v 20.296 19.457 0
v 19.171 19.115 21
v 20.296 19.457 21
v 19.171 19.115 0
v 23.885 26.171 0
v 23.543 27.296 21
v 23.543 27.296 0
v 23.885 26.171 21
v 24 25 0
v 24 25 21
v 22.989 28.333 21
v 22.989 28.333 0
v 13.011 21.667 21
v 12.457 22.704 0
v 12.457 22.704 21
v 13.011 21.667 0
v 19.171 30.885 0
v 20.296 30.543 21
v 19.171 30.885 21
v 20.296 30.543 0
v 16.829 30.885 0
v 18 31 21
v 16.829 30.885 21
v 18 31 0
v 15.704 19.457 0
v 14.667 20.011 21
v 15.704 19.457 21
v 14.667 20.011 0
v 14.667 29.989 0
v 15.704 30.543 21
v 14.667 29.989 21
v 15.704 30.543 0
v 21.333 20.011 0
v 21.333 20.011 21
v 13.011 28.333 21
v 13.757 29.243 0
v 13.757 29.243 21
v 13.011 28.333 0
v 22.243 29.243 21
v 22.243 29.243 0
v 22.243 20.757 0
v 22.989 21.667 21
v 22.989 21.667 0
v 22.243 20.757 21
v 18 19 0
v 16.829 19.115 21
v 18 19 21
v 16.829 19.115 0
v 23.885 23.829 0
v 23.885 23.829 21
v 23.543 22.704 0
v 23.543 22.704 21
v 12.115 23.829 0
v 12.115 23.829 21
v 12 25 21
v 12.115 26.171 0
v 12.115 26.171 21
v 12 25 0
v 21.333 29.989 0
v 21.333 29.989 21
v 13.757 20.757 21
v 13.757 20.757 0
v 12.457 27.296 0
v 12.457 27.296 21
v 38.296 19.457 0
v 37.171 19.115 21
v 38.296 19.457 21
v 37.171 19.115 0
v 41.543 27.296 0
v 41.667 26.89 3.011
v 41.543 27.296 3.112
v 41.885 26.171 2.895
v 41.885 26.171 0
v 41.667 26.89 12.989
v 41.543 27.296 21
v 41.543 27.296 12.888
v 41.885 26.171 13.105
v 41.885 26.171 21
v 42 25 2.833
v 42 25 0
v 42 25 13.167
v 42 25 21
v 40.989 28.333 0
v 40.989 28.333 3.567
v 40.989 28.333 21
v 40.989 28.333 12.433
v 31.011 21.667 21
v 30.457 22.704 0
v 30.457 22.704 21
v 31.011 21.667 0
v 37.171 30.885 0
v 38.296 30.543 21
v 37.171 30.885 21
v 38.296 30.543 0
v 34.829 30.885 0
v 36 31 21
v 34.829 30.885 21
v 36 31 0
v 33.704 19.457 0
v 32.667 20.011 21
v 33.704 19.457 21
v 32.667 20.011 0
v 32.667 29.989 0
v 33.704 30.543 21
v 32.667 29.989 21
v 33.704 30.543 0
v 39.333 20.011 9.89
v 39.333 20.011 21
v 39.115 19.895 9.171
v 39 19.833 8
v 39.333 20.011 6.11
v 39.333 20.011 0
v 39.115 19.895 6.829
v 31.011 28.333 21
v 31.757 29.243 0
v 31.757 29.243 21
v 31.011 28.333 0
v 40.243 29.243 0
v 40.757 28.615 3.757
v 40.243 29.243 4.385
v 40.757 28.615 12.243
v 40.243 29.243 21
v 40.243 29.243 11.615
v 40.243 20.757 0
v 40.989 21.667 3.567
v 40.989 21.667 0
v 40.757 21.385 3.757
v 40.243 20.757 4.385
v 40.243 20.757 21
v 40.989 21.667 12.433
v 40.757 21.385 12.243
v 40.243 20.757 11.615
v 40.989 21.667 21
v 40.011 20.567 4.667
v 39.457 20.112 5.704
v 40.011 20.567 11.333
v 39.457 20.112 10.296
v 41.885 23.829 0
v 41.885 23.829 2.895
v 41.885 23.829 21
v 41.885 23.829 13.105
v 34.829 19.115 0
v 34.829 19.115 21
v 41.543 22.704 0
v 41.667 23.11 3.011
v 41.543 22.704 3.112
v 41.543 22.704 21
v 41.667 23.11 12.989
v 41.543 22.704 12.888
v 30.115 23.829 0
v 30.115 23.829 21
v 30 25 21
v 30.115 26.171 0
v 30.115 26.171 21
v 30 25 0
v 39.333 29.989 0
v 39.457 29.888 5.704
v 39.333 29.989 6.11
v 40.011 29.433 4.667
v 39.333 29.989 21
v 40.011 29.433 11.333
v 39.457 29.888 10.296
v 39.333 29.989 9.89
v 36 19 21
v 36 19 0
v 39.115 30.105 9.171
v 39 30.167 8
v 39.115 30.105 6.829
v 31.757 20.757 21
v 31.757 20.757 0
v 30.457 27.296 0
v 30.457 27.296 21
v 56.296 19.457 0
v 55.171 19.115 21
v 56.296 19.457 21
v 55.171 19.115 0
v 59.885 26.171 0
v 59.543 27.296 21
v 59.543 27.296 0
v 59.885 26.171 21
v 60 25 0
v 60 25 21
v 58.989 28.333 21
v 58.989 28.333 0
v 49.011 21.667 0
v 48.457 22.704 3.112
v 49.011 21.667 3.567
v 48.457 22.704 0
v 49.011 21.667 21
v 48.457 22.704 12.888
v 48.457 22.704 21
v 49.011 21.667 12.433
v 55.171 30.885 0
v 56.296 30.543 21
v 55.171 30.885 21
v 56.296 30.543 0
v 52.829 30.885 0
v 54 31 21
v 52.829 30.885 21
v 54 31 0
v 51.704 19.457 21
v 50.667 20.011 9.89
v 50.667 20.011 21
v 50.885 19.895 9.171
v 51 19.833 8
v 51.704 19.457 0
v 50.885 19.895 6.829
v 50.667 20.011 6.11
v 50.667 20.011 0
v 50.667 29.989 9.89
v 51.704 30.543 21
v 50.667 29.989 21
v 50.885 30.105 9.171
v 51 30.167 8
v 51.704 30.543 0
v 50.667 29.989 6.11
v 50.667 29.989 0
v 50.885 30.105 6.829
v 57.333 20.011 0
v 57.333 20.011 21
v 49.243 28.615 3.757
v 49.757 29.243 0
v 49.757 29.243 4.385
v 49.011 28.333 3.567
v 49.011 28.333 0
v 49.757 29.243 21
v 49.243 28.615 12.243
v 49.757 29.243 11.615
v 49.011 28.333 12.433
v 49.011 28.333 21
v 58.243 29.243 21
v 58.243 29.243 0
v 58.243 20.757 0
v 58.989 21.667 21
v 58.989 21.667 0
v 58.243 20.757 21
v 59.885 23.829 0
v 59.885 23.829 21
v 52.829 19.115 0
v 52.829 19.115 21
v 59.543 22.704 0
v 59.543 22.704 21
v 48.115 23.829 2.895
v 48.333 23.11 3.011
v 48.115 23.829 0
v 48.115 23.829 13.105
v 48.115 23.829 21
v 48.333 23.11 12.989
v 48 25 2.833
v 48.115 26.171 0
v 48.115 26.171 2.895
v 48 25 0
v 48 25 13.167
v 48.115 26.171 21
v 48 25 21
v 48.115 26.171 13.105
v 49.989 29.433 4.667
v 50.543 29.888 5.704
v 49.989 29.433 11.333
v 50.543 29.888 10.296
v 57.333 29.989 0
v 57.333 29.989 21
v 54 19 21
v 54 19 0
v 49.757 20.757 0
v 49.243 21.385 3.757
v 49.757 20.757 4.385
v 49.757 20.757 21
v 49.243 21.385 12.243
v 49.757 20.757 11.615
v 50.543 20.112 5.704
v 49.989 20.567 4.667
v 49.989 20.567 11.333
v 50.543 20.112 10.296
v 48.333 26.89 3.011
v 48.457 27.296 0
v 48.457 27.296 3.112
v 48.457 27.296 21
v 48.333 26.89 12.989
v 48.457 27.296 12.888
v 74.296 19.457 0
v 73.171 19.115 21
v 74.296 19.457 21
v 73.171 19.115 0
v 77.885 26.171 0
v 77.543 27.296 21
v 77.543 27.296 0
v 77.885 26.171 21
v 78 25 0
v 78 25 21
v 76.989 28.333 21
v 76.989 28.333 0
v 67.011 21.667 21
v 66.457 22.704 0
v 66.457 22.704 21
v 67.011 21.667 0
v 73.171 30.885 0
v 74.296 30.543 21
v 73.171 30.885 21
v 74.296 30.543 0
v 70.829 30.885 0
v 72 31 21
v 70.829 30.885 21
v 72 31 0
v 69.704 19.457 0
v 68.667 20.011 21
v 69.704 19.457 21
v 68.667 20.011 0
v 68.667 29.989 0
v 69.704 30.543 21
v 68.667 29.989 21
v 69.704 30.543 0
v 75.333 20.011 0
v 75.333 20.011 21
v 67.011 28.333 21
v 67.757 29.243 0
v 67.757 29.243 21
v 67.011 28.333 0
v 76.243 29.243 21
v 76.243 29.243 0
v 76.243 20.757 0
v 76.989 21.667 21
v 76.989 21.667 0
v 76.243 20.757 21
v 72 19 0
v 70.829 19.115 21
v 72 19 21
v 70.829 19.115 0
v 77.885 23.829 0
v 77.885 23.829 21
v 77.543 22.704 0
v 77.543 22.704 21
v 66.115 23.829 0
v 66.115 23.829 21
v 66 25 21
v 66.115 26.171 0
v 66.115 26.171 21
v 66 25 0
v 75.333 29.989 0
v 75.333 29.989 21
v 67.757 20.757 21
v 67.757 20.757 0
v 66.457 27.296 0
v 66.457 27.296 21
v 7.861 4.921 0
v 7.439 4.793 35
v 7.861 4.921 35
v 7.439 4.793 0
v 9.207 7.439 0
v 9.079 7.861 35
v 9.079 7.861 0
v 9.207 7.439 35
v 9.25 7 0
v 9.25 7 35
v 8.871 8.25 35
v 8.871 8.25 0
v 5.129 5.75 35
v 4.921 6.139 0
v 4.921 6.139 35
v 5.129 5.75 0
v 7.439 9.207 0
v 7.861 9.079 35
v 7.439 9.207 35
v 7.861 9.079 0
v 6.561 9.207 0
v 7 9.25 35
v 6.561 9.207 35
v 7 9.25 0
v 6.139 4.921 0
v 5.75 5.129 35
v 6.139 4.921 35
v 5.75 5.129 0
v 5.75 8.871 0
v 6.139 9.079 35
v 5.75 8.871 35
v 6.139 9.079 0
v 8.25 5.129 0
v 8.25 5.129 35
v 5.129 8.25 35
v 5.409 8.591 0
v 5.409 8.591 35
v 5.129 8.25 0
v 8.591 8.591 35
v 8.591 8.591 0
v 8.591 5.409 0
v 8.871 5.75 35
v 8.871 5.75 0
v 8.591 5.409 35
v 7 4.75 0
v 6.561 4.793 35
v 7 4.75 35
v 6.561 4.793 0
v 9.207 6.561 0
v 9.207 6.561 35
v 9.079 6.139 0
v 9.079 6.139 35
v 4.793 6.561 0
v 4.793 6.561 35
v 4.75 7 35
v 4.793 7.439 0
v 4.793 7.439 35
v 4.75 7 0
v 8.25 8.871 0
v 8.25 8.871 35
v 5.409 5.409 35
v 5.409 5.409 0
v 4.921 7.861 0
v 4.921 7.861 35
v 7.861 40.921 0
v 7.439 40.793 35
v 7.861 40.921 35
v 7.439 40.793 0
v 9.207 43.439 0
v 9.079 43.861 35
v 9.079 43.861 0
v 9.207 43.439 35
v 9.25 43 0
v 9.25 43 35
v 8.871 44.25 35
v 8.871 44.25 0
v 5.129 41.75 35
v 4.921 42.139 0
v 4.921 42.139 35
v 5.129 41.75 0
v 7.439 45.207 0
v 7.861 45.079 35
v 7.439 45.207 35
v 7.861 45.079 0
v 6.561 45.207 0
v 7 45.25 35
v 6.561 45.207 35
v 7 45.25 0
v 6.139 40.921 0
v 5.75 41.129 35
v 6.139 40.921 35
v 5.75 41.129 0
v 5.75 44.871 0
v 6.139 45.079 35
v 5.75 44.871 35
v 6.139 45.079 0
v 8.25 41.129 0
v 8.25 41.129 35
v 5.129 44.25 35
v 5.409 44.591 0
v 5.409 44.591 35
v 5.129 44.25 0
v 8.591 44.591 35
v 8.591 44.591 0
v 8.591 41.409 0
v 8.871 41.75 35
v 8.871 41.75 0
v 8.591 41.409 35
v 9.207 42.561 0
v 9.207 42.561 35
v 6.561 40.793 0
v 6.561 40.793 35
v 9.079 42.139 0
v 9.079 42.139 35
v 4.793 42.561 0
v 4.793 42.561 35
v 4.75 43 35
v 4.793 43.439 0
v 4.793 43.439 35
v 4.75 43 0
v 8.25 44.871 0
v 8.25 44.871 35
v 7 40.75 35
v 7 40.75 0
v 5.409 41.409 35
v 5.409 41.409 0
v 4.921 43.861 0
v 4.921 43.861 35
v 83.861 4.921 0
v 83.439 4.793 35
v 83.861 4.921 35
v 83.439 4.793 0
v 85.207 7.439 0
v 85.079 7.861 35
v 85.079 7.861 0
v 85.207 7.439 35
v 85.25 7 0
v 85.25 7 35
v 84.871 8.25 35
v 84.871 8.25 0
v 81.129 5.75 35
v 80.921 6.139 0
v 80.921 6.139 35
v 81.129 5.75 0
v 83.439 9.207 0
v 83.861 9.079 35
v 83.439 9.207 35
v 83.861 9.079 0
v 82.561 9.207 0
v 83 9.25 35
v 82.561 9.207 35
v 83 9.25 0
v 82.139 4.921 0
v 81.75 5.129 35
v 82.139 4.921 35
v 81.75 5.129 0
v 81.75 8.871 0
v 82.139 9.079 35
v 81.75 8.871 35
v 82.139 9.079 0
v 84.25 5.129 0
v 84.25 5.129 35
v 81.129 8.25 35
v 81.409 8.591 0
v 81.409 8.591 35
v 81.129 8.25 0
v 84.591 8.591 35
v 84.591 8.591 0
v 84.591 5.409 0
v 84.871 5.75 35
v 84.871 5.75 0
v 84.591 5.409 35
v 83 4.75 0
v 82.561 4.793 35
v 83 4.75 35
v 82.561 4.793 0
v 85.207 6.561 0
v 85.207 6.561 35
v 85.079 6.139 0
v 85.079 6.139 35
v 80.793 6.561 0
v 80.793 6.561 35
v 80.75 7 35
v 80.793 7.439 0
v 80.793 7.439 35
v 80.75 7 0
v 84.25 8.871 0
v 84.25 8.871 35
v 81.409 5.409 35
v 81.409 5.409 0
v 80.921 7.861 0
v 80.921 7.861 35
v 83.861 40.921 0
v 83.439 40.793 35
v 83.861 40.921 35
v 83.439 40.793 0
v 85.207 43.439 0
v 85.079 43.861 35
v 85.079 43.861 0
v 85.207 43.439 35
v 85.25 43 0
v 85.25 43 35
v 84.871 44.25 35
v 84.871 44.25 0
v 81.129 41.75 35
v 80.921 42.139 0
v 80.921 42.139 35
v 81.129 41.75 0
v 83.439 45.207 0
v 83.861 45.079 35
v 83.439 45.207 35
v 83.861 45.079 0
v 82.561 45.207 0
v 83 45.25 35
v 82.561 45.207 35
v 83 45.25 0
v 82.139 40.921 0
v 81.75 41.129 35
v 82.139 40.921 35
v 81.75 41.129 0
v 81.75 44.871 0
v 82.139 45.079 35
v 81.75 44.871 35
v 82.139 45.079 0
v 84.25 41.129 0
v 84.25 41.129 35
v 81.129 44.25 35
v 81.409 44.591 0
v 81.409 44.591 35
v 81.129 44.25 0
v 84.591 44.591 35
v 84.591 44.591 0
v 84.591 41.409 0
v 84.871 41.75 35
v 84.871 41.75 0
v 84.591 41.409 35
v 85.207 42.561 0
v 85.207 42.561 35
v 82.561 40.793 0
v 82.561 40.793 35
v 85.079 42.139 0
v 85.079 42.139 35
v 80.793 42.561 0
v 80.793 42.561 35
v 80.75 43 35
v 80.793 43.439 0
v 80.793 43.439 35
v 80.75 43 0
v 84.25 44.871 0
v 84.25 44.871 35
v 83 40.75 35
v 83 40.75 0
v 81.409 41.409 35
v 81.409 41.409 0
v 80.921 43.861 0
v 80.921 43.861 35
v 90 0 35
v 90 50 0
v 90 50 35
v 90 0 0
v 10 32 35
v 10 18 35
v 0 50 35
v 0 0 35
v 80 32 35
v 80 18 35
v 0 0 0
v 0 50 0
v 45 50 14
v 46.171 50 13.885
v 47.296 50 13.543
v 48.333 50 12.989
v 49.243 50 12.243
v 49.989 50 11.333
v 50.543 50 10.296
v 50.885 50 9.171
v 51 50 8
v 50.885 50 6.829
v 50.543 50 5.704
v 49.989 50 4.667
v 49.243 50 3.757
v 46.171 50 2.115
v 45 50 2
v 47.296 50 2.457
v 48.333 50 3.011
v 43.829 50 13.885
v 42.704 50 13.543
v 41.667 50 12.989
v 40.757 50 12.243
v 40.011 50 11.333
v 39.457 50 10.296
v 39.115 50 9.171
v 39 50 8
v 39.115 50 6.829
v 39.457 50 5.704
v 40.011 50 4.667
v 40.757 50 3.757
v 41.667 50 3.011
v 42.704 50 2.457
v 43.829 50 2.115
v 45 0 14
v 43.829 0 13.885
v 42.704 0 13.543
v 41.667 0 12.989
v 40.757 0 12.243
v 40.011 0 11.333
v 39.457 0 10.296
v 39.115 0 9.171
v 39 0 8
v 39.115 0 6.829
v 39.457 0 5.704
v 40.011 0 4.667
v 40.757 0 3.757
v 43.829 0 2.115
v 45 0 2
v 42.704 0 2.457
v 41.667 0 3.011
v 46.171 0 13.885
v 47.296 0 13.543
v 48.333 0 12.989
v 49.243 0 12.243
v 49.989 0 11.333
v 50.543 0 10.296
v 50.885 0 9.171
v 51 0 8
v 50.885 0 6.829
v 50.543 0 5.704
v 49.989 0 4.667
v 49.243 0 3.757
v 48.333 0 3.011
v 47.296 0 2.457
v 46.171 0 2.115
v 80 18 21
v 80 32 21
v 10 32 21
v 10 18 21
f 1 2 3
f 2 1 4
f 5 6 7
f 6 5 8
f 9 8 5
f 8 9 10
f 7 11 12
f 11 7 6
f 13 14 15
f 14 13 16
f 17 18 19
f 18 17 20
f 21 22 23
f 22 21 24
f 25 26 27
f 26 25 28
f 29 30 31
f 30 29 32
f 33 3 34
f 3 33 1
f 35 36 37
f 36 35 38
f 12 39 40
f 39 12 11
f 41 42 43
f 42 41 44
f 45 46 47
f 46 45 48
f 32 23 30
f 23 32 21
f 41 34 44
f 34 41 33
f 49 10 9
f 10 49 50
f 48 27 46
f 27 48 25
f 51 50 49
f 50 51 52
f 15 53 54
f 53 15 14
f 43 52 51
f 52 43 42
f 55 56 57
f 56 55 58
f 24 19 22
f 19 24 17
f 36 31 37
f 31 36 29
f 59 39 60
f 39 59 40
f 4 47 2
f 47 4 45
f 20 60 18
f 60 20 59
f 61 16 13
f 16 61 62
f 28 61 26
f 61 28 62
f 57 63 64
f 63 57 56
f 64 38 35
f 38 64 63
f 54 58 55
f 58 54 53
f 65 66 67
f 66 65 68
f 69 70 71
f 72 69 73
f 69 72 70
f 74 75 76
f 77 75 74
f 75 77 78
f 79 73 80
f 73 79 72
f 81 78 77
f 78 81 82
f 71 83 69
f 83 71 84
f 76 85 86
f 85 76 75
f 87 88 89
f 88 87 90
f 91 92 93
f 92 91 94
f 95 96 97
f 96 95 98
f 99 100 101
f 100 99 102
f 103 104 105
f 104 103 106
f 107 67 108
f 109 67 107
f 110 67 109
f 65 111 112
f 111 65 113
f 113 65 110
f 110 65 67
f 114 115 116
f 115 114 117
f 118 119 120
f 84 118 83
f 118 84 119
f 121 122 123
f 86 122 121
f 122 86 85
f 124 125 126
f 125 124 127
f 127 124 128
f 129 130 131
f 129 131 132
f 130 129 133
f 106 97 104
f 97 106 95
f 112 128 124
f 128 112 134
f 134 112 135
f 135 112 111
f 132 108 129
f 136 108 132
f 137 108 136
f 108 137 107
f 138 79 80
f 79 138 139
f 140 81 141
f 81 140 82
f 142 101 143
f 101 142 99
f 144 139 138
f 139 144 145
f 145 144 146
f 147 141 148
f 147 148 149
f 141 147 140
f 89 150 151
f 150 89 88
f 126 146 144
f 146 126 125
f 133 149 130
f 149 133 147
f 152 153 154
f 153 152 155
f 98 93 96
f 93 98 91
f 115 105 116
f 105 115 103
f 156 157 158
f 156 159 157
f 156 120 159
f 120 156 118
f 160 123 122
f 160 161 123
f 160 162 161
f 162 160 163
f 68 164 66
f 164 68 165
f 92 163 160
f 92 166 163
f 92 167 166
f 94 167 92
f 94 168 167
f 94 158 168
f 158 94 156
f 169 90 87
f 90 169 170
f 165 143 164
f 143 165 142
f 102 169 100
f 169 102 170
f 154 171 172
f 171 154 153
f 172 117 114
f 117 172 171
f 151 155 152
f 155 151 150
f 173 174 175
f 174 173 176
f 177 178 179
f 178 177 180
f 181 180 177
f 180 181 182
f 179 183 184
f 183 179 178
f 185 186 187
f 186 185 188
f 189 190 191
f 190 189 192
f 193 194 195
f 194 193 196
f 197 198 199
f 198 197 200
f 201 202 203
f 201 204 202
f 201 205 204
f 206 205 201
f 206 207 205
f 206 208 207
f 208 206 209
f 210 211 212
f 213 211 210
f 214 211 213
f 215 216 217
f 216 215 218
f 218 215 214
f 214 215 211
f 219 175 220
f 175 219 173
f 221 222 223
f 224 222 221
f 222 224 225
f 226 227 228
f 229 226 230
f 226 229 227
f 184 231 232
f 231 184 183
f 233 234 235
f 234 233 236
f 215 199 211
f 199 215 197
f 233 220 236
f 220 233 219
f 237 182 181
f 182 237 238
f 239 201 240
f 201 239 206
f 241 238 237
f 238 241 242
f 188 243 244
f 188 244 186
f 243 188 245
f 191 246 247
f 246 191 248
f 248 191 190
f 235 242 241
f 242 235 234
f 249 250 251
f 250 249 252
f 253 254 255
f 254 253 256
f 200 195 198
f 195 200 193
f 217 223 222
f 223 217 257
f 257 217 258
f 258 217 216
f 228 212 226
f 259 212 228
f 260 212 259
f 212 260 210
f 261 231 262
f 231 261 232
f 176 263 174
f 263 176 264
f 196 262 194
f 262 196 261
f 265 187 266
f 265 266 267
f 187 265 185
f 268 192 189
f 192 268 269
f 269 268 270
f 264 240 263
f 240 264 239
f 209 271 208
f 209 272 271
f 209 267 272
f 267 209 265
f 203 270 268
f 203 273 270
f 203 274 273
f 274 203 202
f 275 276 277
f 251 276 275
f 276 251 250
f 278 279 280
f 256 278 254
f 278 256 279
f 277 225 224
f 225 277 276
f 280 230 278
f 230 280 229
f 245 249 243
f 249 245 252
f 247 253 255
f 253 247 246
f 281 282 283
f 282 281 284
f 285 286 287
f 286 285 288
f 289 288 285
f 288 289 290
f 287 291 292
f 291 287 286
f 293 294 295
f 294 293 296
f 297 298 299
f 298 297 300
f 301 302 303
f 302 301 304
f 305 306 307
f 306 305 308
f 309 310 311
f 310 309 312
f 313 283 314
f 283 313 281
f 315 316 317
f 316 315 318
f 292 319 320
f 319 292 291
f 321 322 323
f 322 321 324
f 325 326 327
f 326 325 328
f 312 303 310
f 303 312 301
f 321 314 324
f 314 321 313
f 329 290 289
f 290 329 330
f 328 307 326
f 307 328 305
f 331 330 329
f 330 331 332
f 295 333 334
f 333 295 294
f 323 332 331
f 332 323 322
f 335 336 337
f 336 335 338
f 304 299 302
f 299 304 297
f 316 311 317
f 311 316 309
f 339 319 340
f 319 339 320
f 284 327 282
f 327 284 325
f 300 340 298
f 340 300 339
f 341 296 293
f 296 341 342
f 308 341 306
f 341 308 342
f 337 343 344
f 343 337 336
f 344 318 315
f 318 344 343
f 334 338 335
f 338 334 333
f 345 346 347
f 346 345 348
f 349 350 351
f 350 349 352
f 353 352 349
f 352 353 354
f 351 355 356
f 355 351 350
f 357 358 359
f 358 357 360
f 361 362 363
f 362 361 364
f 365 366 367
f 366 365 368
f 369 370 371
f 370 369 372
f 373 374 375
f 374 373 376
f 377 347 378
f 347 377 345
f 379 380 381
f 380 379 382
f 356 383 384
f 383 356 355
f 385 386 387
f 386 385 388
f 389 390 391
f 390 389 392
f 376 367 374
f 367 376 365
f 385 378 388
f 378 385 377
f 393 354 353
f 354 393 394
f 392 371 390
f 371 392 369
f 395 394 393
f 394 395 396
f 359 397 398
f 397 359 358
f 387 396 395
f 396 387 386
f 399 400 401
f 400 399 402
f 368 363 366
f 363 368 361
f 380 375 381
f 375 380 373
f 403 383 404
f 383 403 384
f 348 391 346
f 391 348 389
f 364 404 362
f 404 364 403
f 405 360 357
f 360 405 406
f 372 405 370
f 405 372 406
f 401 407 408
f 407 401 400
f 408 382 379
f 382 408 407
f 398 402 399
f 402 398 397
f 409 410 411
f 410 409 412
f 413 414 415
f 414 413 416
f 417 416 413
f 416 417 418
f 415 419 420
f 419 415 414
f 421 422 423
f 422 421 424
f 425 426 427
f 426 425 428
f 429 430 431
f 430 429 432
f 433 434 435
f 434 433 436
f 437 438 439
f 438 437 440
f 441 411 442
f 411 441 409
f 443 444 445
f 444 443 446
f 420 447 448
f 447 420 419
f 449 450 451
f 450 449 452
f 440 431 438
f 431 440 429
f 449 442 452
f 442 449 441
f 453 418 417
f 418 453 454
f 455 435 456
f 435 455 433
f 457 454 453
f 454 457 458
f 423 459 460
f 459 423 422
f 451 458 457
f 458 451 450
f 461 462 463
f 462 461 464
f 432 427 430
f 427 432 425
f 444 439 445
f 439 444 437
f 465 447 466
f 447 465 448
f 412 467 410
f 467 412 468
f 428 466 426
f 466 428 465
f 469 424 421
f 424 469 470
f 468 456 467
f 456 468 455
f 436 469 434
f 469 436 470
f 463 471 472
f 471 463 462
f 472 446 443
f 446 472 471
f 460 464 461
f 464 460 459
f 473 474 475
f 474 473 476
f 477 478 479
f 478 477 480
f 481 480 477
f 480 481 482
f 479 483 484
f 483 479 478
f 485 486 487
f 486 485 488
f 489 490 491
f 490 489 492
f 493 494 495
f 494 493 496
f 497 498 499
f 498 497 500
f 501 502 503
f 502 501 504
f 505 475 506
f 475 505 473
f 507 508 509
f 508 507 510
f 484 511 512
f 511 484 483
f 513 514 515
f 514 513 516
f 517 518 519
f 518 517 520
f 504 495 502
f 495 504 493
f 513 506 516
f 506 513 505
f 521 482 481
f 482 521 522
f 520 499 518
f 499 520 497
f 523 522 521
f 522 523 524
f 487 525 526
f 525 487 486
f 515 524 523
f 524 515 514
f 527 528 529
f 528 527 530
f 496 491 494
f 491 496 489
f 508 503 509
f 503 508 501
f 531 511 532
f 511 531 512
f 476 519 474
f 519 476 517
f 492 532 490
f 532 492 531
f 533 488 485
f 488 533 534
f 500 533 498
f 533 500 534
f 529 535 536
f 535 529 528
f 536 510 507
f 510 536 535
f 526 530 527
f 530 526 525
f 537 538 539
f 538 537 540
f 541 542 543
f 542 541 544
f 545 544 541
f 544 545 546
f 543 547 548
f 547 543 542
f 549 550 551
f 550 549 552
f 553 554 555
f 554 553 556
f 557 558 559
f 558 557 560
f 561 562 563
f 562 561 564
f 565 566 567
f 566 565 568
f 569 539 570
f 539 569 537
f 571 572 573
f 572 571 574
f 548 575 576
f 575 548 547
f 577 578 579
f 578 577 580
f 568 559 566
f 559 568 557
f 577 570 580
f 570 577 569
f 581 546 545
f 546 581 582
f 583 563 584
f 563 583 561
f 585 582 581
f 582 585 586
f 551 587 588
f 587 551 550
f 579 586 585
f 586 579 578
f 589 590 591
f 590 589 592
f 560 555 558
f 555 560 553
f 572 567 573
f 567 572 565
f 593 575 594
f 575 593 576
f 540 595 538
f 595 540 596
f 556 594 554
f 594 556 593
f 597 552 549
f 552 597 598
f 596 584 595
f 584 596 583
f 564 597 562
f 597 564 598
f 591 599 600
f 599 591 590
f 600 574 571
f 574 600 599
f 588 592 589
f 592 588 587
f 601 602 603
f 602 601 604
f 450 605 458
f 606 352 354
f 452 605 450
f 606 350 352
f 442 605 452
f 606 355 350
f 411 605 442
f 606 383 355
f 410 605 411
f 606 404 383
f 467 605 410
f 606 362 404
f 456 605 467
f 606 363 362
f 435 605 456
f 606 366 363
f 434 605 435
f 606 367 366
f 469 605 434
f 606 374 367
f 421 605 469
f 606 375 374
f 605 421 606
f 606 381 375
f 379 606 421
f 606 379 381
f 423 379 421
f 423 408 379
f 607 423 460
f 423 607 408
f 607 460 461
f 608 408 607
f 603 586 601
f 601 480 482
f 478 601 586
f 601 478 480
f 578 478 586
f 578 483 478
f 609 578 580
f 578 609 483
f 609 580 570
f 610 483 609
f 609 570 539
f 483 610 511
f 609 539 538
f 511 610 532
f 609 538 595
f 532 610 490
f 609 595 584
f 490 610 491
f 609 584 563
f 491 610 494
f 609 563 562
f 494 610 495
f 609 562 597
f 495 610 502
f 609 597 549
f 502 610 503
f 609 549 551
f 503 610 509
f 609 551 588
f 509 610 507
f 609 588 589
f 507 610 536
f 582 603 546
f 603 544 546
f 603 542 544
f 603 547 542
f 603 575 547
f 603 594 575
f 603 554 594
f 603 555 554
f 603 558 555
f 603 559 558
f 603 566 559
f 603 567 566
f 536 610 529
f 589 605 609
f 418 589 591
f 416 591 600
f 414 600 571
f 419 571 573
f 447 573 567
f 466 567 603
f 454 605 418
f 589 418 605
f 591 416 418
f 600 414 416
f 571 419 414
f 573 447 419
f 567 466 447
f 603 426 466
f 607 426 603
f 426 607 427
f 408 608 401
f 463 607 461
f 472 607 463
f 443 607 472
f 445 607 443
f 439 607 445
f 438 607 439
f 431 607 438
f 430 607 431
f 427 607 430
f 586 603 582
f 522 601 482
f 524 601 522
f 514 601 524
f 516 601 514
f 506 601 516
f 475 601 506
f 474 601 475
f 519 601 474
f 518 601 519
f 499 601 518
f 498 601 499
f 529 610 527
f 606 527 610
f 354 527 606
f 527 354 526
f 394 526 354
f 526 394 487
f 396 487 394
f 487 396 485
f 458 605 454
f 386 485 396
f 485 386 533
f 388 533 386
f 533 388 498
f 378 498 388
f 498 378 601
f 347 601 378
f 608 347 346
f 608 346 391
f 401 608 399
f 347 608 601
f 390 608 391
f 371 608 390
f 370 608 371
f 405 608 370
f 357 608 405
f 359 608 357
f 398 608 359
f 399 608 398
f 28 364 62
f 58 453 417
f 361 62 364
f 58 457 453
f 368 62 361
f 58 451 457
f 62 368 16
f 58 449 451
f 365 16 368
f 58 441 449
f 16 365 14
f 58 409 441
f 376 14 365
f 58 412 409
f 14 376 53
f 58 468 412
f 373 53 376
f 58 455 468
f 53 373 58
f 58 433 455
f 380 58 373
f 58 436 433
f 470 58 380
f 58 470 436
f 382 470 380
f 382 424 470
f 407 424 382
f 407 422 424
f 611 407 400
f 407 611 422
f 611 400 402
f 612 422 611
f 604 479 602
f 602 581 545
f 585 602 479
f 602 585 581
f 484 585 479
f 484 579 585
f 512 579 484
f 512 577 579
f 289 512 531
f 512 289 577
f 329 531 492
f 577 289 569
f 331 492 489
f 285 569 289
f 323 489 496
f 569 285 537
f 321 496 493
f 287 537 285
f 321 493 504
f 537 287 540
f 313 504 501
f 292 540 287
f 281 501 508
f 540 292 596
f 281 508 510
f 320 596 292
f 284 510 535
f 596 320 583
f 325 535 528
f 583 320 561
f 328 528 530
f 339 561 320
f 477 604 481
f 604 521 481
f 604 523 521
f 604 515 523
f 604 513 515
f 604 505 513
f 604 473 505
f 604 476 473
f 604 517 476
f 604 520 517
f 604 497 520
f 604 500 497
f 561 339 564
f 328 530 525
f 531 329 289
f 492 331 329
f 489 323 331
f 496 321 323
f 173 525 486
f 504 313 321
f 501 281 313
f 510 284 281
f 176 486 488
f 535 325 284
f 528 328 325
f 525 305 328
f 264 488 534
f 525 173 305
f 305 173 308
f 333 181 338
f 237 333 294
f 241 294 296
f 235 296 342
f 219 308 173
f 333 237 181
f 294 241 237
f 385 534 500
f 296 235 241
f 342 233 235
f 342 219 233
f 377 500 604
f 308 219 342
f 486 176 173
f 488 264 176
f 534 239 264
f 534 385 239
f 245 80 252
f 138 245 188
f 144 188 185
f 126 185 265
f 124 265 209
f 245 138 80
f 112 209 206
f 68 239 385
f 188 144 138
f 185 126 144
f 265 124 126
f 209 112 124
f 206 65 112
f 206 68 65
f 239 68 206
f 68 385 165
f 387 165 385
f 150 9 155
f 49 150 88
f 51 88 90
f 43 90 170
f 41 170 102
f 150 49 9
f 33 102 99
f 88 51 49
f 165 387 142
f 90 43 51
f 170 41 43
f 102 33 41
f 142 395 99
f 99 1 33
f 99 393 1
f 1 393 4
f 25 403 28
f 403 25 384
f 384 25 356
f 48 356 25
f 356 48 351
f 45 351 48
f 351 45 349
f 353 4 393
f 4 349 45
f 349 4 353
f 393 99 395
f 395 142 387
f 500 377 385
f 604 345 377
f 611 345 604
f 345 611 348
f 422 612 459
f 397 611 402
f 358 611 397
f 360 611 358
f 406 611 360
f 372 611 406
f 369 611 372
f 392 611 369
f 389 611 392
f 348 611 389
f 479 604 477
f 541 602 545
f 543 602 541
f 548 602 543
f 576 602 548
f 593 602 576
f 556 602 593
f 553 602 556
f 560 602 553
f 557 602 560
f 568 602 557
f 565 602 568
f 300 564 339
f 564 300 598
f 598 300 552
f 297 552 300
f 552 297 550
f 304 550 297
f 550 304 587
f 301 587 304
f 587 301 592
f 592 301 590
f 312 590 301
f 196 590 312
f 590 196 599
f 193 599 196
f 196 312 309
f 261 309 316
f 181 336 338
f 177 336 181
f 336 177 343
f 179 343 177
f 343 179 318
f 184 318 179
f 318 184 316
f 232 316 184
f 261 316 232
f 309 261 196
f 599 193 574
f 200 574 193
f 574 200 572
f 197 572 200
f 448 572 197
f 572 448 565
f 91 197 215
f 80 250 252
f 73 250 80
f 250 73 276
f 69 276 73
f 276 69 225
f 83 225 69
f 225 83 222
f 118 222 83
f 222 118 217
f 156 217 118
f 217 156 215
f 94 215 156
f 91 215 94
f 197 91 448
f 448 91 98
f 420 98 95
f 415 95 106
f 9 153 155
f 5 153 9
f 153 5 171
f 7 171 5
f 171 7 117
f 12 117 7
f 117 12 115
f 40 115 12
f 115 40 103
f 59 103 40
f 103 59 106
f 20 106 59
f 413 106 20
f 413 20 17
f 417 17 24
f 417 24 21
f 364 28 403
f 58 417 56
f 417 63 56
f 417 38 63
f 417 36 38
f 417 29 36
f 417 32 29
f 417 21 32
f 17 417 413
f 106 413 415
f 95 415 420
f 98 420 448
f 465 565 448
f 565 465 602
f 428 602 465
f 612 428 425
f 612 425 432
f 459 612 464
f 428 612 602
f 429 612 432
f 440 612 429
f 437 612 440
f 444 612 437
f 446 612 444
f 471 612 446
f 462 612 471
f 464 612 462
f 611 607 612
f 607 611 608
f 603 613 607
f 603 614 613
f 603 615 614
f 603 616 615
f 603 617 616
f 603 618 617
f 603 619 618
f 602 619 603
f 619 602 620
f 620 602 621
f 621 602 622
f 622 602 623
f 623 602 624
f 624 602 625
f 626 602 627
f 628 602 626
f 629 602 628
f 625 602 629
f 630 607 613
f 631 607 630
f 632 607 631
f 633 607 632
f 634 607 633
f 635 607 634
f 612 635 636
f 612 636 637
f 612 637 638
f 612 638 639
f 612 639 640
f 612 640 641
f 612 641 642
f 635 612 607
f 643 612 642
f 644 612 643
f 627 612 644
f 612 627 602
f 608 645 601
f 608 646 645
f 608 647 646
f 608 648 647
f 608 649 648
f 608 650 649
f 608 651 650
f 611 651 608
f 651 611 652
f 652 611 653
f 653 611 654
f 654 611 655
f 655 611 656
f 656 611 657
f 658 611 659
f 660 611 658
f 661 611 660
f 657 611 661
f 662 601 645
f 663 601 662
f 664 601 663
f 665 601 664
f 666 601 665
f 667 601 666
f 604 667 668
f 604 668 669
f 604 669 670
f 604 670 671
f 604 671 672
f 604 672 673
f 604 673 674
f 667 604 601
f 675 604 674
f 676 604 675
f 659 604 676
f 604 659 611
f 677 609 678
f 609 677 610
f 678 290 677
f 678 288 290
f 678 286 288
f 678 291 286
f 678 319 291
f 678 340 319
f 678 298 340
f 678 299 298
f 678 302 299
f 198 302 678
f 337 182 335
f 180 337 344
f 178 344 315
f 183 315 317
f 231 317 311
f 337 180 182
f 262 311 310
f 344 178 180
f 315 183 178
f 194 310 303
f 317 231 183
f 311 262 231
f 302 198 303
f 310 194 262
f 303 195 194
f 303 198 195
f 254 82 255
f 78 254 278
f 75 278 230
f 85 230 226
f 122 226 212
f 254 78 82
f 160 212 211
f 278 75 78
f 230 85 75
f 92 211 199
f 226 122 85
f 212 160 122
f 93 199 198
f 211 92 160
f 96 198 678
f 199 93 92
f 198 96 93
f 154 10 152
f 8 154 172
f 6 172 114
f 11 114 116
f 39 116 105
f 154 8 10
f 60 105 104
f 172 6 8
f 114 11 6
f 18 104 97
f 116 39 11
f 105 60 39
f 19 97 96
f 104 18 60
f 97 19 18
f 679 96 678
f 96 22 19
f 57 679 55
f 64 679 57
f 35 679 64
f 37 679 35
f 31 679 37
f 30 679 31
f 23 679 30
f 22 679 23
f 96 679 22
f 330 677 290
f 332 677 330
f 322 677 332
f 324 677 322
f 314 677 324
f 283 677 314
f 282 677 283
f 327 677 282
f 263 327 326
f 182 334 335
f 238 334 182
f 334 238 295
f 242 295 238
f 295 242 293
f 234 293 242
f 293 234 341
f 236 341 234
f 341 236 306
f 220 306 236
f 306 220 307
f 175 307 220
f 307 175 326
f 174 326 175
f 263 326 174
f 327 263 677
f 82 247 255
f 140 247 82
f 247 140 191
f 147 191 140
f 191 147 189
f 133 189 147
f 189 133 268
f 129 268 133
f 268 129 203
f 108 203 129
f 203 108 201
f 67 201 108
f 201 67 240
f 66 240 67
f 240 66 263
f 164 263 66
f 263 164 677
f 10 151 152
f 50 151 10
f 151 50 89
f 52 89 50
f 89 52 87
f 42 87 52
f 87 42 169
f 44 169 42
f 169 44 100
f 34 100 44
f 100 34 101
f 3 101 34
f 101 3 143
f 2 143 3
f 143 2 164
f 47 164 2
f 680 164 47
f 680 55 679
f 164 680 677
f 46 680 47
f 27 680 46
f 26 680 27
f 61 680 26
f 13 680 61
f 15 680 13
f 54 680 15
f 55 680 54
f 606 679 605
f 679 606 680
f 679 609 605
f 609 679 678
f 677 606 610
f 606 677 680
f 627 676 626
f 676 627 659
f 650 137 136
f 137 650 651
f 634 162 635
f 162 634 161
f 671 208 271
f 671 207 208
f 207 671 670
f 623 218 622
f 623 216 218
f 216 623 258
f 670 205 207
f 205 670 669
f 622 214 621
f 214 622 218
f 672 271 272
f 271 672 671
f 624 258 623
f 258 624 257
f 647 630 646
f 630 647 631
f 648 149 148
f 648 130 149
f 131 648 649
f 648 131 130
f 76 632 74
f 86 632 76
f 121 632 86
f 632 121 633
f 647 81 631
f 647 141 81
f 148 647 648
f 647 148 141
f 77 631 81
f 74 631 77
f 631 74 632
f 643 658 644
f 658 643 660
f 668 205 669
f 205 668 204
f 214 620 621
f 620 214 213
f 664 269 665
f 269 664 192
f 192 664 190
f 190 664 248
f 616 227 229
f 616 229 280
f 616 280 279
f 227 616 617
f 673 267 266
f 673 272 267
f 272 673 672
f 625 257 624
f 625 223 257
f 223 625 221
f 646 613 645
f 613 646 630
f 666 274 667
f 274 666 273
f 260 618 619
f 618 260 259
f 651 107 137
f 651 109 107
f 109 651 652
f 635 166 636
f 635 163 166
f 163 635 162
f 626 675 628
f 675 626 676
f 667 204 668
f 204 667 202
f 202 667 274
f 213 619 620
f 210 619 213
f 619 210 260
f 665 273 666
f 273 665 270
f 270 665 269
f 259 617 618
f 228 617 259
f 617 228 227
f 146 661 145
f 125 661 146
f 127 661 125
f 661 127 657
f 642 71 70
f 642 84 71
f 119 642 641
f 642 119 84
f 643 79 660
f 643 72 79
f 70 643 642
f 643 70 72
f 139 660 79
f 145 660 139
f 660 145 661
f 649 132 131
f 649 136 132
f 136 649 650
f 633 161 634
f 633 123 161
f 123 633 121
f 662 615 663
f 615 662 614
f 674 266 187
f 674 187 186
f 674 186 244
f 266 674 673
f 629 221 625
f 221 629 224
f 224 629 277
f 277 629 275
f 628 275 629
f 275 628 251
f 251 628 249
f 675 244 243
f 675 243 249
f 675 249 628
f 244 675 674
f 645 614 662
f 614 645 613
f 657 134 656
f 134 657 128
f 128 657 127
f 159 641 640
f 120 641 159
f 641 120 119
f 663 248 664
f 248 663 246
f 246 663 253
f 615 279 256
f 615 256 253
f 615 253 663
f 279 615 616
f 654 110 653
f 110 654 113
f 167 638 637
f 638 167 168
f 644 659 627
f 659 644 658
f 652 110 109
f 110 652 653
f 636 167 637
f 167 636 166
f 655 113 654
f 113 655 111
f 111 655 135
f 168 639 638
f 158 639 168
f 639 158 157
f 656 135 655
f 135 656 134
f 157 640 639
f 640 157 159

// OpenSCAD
$fn = 32;

// ----------------------------------------------------------------------
// Manifold block: side_outlet manifold
// ----------------------------------------------------------------------

// --- parameters (mm) ---
block_l = 90;             // block length, X
block_w = 50;             // block width, Y
block_h = 35;             // block height, Z
port_d = 12;              // port bore diameter
port_pitch = 18;          // port pitch along X
gallery_d = 14;           // top gallery width, Y
gallery_depth = 14;       // gallery pocket depth
wall_p = 10;              // gallery end wall thickness, X
mnt_d = 4.5;              // mounting hole diameter
mnt_in = 7;               // mounting hole inset from the edges
out_d = 12;               // outlet bore diameter
out_z = 8;                // outlet axis height
fit_tol = 0.05;           // tolerance for press fits, mm
free_tol = 0.3;           // tolerance for clearance fits, mm

n_ports = 4;  // ports in the row
port_x0 = (block_l - (n_ports - 1) * port_pitch) / 2;  // first port X

difference() {
  cube([block_l, block_w, block_h]);
  for (i = [0 : n_ports - 1])
    translate([port_x0 + i * port_pitch, block_w / 2, -1])
      cylinder(h = block_h + 2, d = port_d);
  translate([wall_p, block_w / 2 - gallery_d / 2, block_h - gallery_depth])
    cube([block_l - 2 * wall_p, gallery_d, gallery_depth + 1]);
  for (cx = [mnt_in, block_l - mnt_in])
    for (cy = [mnt_in, block_w - mnt_in])
      translate([cx, cy, -1]) cylinder(h = block_h + 2, d = mnt_d);
  translate([block_l / 2, -1, out_z]) rotate([-90, 0, 0])
    cylinder(h = block_w + 2, d = out_d);
}
